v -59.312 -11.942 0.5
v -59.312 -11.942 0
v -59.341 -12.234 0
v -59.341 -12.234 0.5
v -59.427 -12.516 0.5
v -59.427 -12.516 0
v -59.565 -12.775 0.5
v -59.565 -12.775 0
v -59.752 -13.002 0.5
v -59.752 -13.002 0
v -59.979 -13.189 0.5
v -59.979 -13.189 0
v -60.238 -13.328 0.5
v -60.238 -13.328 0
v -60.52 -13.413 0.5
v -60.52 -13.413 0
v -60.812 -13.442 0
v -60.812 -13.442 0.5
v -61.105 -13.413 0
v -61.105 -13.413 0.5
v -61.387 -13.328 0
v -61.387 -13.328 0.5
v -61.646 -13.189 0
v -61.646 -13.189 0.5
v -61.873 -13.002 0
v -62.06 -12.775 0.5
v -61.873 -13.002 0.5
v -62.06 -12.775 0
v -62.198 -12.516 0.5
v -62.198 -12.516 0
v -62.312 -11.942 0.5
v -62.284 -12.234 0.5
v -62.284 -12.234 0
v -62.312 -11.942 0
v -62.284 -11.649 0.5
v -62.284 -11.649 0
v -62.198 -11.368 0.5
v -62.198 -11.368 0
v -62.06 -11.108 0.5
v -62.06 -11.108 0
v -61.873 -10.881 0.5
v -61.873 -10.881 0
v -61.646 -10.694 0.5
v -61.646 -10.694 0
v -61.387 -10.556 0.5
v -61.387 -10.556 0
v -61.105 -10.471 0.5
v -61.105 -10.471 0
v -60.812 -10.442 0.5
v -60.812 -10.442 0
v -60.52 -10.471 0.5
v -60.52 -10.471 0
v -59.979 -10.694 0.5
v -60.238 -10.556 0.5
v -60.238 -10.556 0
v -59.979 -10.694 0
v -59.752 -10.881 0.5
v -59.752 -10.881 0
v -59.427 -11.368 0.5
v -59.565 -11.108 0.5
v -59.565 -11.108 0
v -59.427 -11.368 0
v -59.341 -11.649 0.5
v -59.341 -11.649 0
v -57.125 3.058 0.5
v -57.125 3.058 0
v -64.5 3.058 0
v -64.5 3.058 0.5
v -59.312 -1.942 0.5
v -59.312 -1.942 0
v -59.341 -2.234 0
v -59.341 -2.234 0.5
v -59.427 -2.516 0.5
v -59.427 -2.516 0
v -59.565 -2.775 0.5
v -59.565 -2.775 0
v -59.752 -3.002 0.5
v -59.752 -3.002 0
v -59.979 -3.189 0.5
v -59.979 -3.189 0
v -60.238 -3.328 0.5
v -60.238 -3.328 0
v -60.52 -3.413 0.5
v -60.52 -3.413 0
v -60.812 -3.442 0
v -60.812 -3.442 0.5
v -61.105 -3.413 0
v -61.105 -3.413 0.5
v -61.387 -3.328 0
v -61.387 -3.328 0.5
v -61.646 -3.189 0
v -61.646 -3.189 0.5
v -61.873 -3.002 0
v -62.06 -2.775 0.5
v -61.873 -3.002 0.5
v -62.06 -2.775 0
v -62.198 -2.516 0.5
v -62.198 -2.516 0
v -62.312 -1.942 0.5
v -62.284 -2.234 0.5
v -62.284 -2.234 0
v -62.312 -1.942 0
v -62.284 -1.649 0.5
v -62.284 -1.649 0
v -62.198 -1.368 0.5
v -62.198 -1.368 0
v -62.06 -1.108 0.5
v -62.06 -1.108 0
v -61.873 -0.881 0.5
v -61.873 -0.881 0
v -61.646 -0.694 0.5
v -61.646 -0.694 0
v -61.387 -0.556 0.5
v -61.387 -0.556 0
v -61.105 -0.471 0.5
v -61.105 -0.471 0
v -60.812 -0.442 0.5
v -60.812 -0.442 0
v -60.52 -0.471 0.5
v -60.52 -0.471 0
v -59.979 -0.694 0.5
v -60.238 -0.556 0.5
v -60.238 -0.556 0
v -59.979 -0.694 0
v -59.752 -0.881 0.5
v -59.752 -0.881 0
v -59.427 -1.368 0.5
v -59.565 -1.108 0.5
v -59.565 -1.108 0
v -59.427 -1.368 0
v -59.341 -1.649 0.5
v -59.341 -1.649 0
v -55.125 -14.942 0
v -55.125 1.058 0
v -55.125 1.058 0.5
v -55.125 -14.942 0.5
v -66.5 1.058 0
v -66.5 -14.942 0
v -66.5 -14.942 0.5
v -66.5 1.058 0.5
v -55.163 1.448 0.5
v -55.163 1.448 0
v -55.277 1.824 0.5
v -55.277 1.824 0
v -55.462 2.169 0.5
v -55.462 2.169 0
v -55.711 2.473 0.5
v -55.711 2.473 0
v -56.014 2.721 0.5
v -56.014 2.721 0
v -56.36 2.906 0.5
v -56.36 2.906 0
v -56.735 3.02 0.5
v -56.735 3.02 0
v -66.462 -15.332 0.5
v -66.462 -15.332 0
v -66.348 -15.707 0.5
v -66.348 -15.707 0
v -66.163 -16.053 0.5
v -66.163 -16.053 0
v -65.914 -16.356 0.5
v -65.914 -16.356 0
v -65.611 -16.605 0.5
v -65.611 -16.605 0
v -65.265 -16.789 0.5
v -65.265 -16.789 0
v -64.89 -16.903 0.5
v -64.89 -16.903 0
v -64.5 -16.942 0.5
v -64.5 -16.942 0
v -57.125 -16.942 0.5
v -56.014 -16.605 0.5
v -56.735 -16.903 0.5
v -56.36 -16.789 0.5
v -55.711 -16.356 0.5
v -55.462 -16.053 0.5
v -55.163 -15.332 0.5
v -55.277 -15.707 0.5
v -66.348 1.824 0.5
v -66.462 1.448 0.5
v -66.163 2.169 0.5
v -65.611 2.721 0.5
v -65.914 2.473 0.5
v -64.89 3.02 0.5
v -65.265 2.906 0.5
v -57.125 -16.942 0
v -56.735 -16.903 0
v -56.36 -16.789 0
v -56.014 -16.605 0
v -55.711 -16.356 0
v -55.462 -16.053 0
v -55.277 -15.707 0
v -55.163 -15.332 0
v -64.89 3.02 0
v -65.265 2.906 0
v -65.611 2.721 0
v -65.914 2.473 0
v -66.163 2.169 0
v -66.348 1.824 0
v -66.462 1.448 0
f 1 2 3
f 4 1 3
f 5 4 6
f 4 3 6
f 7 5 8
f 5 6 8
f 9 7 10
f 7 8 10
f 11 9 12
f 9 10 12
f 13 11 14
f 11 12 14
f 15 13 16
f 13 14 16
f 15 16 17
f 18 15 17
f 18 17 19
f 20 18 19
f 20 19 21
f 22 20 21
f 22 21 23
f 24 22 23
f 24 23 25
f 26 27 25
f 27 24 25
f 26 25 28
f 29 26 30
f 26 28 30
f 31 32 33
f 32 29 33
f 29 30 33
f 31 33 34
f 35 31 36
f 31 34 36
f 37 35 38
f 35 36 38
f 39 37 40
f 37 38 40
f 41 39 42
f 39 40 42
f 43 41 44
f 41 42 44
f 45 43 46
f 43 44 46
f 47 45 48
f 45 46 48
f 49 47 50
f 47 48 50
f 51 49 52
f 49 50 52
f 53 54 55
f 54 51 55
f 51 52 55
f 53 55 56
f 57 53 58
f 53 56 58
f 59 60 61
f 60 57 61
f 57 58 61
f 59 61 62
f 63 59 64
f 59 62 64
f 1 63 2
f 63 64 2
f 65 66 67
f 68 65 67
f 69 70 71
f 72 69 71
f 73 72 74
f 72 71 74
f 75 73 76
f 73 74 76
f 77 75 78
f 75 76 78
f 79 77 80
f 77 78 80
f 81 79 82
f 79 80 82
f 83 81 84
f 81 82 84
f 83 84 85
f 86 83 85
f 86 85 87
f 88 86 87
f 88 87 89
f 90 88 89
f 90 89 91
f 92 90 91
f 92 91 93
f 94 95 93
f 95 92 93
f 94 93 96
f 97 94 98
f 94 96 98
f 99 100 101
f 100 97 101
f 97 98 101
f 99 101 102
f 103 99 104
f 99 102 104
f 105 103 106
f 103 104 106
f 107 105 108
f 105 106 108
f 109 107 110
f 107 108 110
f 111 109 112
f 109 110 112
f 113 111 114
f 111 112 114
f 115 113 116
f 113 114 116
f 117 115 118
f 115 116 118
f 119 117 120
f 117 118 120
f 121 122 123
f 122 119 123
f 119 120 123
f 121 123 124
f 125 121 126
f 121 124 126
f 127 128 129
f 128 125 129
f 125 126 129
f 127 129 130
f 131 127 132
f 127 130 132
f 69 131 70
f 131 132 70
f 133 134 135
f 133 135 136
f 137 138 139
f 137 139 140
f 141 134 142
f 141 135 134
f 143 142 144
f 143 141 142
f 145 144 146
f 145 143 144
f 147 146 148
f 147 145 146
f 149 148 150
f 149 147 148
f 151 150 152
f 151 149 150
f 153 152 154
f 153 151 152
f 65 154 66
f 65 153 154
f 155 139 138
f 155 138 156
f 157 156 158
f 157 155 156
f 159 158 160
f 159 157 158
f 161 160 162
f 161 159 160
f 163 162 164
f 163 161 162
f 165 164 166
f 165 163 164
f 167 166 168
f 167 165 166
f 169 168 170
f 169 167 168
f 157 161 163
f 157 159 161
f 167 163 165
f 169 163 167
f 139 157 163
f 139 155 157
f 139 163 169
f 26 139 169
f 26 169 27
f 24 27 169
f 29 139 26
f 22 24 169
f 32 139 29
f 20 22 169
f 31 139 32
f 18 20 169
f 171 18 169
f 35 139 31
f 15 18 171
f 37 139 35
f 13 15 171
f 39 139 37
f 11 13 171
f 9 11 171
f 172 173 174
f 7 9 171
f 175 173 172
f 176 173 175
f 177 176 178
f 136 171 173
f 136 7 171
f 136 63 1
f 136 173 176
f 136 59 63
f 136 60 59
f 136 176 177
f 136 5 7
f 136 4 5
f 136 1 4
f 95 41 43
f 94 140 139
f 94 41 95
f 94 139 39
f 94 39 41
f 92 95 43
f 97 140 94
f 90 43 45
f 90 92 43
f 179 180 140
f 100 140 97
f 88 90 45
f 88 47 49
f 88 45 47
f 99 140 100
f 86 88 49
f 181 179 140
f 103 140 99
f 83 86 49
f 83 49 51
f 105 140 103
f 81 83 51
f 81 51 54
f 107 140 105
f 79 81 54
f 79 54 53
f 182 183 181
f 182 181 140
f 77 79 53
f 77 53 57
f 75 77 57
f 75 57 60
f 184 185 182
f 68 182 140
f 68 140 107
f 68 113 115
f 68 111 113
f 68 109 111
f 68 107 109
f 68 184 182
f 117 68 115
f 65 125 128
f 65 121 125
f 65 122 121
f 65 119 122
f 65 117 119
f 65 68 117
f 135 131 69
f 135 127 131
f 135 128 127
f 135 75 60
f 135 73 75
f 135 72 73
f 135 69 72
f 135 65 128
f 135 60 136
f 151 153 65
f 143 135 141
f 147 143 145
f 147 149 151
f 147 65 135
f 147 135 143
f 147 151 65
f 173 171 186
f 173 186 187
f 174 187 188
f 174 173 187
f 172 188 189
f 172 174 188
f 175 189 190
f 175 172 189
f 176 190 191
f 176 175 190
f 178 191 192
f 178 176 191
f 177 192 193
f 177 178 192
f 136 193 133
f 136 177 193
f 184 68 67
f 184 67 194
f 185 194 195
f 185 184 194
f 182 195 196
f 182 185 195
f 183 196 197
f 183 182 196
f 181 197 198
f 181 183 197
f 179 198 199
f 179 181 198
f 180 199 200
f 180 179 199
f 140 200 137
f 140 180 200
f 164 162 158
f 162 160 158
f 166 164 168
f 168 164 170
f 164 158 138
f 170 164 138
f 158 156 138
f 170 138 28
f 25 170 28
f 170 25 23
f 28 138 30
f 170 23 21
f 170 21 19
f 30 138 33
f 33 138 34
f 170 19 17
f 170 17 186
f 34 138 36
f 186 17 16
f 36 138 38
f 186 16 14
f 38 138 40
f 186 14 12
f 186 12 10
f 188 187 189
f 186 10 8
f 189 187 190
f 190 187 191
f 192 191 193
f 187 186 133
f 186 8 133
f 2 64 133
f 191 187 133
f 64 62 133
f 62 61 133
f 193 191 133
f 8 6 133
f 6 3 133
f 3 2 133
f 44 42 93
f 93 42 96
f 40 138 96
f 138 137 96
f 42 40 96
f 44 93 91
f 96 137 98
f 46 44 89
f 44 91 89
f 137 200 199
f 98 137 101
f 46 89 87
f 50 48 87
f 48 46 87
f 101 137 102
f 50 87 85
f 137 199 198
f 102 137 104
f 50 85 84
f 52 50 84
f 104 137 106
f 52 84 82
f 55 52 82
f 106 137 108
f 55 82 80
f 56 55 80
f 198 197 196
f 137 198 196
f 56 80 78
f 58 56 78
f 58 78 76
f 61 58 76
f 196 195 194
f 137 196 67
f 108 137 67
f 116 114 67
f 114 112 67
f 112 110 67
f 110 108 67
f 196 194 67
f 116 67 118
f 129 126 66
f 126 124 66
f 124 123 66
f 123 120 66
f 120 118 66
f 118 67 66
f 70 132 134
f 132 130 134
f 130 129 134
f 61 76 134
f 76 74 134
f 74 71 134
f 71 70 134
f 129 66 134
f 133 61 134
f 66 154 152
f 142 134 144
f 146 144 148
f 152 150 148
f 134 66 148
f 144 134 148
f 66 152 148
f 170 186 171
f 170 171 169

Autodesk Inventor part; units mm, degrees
ref_plane "YZ Plane" through (0, 0, 0) normal (1, 0, 0) x (0, 1, 0)
ref_plane "XZ Plane" through (0, 0, 0) normal (0, 1, 0) x (-1, 0, 0)
ref_plane "XY Plane" through (0, 0, 0) normal (0, 0, 1) x (1, 0, 0)
sketch "Sketch1" plane through (0, 0, 0) normal (0, 0, 1) x (1, 0, 0)
  line L0 (55.125, -6.9417) -> (55.125, -0.9417) projected
  line L1 (55.125, -6.9417) -> (66.5, -6.9417) projected
  line L2 (66.5, 3.0583) -> (66.5, -6.9417) projected
  line L3 (66.5, 3.0583) -> (-66.5, 3.0583) projected
  line L4 (-66.5, -6.9417) -> (-66.5, 3.0583) projected
  line L5 (-66.5, -6.9417) -> (-55.125, -6.9417) projected
  line L6 (-55.125, -0.9417) -> (-55.125, -6.9417) projected
  line L7 (55.125, -0.9417) -> (-55.125, -0.9417) projected
  line L8 (-55.125, -6.9417) -> (-55.125, -35.9417) projected
  line L9 (-55.125, -6.9417) -> (-66.5, -6.9417) projected
  line L10 (-66.5, -40.9417) -> (-66.5, -6.9417) projected
  line L11 (-37.5645, -40.9417) -> (-66.5, -40.9417) projected
  line L12 (-37.5645, -38.4017) -> (-37.5645, -40.9417) projected
  line L13 (-37.5645, -38.4017) -> (-28.75, -38.4017) projected
  line L14 (55.125, -35.9417) -> (55.125, -6.9417) projected
  line L15 (28.75, -38.4017) -> (37.5645, -38.4017) projected
  line L16 (37.5645, -40.9417) -> (37.5645, -38.4017) projected
  line L17 (66.5, -40.9417) -> (37.5645, -40.9417) projected
  line L18 (66.5, -6.9417) -> (66.5, -40.9417) projected
  line L19 (55.125, -6.9417) -> (66.5, -6.9417) projected
  line L20 (-66.5, 3.0583) -> (-55.125, 3.0583)
  line L21 (-55.125, 3.0583) -> (-55.125, -16.9417)
  line L22 (-55.125, -16.9417) -> (-66.5, -16.9417)
  line L23 (-66.5, -16.9417) -> (-66.5, 3.0583)
  line L24 (-66.5, -6.9417) -> (-66.5, -11.9417)
  circle A0 centre (-60.8125, -1.9417) radius 1.5
  circle A1 centre (-60.8125, -11.9417) radius 1.5
  circle A2 centre (-60.8125, -11.9417) radius 1.375 projected
  circle A3 centre (60.8125, -11.9417) radius 1.375 projected
  circle A4 centre (-60.8125, -1.9417) radius 1.375 projected
  circle A5 centre (60.8125, -1.9417) radius 1.375 projected
  line L25 (-53.125, -37.9417) -> (-28.75, -37.9417) projected
  arc A6 (-55.125, -35.9417) -> (-53.125, -37.9417) centre (-53.125, -35.9417) ccw projected
  line L26 (-28.75, -37.9417) -> (-28.75, -38.4017) projected
  line L27 (28.75, -37.9417) -> (53.125, -37.9417) projected
  line L28 (28.75, -38.4017) -> (28.75, -37.9417) projected
  arc A7 (53.125, -37.9417) -> (55.125, -35.9417) centre (53.125, -35.9417) ccw projected
  point P0 (0, 0)
  point P1 (-60.8125, 3.0583)
  point P2 (-66.5, -1.9417)
  dimension "d0" = 20
  dimension "d1" = 5
  dimension "d2" = 3
  dimension "d4" = 3
extrude "Extrusion1" add sketch "Sketch1" along normal blind 0.5 contours L6 L5 L4 L3 L21 | L8 L22 L10 L5
fillet "Fillet1" radius 2 4 edges at (-66.5, 3.0583, 0.25) (-55.125, 3.0583, 0.25) (-55.125, -16.9417, 0.25) (-66.5, -16.9417, 0.25)
properties part number "FlexHinge"
